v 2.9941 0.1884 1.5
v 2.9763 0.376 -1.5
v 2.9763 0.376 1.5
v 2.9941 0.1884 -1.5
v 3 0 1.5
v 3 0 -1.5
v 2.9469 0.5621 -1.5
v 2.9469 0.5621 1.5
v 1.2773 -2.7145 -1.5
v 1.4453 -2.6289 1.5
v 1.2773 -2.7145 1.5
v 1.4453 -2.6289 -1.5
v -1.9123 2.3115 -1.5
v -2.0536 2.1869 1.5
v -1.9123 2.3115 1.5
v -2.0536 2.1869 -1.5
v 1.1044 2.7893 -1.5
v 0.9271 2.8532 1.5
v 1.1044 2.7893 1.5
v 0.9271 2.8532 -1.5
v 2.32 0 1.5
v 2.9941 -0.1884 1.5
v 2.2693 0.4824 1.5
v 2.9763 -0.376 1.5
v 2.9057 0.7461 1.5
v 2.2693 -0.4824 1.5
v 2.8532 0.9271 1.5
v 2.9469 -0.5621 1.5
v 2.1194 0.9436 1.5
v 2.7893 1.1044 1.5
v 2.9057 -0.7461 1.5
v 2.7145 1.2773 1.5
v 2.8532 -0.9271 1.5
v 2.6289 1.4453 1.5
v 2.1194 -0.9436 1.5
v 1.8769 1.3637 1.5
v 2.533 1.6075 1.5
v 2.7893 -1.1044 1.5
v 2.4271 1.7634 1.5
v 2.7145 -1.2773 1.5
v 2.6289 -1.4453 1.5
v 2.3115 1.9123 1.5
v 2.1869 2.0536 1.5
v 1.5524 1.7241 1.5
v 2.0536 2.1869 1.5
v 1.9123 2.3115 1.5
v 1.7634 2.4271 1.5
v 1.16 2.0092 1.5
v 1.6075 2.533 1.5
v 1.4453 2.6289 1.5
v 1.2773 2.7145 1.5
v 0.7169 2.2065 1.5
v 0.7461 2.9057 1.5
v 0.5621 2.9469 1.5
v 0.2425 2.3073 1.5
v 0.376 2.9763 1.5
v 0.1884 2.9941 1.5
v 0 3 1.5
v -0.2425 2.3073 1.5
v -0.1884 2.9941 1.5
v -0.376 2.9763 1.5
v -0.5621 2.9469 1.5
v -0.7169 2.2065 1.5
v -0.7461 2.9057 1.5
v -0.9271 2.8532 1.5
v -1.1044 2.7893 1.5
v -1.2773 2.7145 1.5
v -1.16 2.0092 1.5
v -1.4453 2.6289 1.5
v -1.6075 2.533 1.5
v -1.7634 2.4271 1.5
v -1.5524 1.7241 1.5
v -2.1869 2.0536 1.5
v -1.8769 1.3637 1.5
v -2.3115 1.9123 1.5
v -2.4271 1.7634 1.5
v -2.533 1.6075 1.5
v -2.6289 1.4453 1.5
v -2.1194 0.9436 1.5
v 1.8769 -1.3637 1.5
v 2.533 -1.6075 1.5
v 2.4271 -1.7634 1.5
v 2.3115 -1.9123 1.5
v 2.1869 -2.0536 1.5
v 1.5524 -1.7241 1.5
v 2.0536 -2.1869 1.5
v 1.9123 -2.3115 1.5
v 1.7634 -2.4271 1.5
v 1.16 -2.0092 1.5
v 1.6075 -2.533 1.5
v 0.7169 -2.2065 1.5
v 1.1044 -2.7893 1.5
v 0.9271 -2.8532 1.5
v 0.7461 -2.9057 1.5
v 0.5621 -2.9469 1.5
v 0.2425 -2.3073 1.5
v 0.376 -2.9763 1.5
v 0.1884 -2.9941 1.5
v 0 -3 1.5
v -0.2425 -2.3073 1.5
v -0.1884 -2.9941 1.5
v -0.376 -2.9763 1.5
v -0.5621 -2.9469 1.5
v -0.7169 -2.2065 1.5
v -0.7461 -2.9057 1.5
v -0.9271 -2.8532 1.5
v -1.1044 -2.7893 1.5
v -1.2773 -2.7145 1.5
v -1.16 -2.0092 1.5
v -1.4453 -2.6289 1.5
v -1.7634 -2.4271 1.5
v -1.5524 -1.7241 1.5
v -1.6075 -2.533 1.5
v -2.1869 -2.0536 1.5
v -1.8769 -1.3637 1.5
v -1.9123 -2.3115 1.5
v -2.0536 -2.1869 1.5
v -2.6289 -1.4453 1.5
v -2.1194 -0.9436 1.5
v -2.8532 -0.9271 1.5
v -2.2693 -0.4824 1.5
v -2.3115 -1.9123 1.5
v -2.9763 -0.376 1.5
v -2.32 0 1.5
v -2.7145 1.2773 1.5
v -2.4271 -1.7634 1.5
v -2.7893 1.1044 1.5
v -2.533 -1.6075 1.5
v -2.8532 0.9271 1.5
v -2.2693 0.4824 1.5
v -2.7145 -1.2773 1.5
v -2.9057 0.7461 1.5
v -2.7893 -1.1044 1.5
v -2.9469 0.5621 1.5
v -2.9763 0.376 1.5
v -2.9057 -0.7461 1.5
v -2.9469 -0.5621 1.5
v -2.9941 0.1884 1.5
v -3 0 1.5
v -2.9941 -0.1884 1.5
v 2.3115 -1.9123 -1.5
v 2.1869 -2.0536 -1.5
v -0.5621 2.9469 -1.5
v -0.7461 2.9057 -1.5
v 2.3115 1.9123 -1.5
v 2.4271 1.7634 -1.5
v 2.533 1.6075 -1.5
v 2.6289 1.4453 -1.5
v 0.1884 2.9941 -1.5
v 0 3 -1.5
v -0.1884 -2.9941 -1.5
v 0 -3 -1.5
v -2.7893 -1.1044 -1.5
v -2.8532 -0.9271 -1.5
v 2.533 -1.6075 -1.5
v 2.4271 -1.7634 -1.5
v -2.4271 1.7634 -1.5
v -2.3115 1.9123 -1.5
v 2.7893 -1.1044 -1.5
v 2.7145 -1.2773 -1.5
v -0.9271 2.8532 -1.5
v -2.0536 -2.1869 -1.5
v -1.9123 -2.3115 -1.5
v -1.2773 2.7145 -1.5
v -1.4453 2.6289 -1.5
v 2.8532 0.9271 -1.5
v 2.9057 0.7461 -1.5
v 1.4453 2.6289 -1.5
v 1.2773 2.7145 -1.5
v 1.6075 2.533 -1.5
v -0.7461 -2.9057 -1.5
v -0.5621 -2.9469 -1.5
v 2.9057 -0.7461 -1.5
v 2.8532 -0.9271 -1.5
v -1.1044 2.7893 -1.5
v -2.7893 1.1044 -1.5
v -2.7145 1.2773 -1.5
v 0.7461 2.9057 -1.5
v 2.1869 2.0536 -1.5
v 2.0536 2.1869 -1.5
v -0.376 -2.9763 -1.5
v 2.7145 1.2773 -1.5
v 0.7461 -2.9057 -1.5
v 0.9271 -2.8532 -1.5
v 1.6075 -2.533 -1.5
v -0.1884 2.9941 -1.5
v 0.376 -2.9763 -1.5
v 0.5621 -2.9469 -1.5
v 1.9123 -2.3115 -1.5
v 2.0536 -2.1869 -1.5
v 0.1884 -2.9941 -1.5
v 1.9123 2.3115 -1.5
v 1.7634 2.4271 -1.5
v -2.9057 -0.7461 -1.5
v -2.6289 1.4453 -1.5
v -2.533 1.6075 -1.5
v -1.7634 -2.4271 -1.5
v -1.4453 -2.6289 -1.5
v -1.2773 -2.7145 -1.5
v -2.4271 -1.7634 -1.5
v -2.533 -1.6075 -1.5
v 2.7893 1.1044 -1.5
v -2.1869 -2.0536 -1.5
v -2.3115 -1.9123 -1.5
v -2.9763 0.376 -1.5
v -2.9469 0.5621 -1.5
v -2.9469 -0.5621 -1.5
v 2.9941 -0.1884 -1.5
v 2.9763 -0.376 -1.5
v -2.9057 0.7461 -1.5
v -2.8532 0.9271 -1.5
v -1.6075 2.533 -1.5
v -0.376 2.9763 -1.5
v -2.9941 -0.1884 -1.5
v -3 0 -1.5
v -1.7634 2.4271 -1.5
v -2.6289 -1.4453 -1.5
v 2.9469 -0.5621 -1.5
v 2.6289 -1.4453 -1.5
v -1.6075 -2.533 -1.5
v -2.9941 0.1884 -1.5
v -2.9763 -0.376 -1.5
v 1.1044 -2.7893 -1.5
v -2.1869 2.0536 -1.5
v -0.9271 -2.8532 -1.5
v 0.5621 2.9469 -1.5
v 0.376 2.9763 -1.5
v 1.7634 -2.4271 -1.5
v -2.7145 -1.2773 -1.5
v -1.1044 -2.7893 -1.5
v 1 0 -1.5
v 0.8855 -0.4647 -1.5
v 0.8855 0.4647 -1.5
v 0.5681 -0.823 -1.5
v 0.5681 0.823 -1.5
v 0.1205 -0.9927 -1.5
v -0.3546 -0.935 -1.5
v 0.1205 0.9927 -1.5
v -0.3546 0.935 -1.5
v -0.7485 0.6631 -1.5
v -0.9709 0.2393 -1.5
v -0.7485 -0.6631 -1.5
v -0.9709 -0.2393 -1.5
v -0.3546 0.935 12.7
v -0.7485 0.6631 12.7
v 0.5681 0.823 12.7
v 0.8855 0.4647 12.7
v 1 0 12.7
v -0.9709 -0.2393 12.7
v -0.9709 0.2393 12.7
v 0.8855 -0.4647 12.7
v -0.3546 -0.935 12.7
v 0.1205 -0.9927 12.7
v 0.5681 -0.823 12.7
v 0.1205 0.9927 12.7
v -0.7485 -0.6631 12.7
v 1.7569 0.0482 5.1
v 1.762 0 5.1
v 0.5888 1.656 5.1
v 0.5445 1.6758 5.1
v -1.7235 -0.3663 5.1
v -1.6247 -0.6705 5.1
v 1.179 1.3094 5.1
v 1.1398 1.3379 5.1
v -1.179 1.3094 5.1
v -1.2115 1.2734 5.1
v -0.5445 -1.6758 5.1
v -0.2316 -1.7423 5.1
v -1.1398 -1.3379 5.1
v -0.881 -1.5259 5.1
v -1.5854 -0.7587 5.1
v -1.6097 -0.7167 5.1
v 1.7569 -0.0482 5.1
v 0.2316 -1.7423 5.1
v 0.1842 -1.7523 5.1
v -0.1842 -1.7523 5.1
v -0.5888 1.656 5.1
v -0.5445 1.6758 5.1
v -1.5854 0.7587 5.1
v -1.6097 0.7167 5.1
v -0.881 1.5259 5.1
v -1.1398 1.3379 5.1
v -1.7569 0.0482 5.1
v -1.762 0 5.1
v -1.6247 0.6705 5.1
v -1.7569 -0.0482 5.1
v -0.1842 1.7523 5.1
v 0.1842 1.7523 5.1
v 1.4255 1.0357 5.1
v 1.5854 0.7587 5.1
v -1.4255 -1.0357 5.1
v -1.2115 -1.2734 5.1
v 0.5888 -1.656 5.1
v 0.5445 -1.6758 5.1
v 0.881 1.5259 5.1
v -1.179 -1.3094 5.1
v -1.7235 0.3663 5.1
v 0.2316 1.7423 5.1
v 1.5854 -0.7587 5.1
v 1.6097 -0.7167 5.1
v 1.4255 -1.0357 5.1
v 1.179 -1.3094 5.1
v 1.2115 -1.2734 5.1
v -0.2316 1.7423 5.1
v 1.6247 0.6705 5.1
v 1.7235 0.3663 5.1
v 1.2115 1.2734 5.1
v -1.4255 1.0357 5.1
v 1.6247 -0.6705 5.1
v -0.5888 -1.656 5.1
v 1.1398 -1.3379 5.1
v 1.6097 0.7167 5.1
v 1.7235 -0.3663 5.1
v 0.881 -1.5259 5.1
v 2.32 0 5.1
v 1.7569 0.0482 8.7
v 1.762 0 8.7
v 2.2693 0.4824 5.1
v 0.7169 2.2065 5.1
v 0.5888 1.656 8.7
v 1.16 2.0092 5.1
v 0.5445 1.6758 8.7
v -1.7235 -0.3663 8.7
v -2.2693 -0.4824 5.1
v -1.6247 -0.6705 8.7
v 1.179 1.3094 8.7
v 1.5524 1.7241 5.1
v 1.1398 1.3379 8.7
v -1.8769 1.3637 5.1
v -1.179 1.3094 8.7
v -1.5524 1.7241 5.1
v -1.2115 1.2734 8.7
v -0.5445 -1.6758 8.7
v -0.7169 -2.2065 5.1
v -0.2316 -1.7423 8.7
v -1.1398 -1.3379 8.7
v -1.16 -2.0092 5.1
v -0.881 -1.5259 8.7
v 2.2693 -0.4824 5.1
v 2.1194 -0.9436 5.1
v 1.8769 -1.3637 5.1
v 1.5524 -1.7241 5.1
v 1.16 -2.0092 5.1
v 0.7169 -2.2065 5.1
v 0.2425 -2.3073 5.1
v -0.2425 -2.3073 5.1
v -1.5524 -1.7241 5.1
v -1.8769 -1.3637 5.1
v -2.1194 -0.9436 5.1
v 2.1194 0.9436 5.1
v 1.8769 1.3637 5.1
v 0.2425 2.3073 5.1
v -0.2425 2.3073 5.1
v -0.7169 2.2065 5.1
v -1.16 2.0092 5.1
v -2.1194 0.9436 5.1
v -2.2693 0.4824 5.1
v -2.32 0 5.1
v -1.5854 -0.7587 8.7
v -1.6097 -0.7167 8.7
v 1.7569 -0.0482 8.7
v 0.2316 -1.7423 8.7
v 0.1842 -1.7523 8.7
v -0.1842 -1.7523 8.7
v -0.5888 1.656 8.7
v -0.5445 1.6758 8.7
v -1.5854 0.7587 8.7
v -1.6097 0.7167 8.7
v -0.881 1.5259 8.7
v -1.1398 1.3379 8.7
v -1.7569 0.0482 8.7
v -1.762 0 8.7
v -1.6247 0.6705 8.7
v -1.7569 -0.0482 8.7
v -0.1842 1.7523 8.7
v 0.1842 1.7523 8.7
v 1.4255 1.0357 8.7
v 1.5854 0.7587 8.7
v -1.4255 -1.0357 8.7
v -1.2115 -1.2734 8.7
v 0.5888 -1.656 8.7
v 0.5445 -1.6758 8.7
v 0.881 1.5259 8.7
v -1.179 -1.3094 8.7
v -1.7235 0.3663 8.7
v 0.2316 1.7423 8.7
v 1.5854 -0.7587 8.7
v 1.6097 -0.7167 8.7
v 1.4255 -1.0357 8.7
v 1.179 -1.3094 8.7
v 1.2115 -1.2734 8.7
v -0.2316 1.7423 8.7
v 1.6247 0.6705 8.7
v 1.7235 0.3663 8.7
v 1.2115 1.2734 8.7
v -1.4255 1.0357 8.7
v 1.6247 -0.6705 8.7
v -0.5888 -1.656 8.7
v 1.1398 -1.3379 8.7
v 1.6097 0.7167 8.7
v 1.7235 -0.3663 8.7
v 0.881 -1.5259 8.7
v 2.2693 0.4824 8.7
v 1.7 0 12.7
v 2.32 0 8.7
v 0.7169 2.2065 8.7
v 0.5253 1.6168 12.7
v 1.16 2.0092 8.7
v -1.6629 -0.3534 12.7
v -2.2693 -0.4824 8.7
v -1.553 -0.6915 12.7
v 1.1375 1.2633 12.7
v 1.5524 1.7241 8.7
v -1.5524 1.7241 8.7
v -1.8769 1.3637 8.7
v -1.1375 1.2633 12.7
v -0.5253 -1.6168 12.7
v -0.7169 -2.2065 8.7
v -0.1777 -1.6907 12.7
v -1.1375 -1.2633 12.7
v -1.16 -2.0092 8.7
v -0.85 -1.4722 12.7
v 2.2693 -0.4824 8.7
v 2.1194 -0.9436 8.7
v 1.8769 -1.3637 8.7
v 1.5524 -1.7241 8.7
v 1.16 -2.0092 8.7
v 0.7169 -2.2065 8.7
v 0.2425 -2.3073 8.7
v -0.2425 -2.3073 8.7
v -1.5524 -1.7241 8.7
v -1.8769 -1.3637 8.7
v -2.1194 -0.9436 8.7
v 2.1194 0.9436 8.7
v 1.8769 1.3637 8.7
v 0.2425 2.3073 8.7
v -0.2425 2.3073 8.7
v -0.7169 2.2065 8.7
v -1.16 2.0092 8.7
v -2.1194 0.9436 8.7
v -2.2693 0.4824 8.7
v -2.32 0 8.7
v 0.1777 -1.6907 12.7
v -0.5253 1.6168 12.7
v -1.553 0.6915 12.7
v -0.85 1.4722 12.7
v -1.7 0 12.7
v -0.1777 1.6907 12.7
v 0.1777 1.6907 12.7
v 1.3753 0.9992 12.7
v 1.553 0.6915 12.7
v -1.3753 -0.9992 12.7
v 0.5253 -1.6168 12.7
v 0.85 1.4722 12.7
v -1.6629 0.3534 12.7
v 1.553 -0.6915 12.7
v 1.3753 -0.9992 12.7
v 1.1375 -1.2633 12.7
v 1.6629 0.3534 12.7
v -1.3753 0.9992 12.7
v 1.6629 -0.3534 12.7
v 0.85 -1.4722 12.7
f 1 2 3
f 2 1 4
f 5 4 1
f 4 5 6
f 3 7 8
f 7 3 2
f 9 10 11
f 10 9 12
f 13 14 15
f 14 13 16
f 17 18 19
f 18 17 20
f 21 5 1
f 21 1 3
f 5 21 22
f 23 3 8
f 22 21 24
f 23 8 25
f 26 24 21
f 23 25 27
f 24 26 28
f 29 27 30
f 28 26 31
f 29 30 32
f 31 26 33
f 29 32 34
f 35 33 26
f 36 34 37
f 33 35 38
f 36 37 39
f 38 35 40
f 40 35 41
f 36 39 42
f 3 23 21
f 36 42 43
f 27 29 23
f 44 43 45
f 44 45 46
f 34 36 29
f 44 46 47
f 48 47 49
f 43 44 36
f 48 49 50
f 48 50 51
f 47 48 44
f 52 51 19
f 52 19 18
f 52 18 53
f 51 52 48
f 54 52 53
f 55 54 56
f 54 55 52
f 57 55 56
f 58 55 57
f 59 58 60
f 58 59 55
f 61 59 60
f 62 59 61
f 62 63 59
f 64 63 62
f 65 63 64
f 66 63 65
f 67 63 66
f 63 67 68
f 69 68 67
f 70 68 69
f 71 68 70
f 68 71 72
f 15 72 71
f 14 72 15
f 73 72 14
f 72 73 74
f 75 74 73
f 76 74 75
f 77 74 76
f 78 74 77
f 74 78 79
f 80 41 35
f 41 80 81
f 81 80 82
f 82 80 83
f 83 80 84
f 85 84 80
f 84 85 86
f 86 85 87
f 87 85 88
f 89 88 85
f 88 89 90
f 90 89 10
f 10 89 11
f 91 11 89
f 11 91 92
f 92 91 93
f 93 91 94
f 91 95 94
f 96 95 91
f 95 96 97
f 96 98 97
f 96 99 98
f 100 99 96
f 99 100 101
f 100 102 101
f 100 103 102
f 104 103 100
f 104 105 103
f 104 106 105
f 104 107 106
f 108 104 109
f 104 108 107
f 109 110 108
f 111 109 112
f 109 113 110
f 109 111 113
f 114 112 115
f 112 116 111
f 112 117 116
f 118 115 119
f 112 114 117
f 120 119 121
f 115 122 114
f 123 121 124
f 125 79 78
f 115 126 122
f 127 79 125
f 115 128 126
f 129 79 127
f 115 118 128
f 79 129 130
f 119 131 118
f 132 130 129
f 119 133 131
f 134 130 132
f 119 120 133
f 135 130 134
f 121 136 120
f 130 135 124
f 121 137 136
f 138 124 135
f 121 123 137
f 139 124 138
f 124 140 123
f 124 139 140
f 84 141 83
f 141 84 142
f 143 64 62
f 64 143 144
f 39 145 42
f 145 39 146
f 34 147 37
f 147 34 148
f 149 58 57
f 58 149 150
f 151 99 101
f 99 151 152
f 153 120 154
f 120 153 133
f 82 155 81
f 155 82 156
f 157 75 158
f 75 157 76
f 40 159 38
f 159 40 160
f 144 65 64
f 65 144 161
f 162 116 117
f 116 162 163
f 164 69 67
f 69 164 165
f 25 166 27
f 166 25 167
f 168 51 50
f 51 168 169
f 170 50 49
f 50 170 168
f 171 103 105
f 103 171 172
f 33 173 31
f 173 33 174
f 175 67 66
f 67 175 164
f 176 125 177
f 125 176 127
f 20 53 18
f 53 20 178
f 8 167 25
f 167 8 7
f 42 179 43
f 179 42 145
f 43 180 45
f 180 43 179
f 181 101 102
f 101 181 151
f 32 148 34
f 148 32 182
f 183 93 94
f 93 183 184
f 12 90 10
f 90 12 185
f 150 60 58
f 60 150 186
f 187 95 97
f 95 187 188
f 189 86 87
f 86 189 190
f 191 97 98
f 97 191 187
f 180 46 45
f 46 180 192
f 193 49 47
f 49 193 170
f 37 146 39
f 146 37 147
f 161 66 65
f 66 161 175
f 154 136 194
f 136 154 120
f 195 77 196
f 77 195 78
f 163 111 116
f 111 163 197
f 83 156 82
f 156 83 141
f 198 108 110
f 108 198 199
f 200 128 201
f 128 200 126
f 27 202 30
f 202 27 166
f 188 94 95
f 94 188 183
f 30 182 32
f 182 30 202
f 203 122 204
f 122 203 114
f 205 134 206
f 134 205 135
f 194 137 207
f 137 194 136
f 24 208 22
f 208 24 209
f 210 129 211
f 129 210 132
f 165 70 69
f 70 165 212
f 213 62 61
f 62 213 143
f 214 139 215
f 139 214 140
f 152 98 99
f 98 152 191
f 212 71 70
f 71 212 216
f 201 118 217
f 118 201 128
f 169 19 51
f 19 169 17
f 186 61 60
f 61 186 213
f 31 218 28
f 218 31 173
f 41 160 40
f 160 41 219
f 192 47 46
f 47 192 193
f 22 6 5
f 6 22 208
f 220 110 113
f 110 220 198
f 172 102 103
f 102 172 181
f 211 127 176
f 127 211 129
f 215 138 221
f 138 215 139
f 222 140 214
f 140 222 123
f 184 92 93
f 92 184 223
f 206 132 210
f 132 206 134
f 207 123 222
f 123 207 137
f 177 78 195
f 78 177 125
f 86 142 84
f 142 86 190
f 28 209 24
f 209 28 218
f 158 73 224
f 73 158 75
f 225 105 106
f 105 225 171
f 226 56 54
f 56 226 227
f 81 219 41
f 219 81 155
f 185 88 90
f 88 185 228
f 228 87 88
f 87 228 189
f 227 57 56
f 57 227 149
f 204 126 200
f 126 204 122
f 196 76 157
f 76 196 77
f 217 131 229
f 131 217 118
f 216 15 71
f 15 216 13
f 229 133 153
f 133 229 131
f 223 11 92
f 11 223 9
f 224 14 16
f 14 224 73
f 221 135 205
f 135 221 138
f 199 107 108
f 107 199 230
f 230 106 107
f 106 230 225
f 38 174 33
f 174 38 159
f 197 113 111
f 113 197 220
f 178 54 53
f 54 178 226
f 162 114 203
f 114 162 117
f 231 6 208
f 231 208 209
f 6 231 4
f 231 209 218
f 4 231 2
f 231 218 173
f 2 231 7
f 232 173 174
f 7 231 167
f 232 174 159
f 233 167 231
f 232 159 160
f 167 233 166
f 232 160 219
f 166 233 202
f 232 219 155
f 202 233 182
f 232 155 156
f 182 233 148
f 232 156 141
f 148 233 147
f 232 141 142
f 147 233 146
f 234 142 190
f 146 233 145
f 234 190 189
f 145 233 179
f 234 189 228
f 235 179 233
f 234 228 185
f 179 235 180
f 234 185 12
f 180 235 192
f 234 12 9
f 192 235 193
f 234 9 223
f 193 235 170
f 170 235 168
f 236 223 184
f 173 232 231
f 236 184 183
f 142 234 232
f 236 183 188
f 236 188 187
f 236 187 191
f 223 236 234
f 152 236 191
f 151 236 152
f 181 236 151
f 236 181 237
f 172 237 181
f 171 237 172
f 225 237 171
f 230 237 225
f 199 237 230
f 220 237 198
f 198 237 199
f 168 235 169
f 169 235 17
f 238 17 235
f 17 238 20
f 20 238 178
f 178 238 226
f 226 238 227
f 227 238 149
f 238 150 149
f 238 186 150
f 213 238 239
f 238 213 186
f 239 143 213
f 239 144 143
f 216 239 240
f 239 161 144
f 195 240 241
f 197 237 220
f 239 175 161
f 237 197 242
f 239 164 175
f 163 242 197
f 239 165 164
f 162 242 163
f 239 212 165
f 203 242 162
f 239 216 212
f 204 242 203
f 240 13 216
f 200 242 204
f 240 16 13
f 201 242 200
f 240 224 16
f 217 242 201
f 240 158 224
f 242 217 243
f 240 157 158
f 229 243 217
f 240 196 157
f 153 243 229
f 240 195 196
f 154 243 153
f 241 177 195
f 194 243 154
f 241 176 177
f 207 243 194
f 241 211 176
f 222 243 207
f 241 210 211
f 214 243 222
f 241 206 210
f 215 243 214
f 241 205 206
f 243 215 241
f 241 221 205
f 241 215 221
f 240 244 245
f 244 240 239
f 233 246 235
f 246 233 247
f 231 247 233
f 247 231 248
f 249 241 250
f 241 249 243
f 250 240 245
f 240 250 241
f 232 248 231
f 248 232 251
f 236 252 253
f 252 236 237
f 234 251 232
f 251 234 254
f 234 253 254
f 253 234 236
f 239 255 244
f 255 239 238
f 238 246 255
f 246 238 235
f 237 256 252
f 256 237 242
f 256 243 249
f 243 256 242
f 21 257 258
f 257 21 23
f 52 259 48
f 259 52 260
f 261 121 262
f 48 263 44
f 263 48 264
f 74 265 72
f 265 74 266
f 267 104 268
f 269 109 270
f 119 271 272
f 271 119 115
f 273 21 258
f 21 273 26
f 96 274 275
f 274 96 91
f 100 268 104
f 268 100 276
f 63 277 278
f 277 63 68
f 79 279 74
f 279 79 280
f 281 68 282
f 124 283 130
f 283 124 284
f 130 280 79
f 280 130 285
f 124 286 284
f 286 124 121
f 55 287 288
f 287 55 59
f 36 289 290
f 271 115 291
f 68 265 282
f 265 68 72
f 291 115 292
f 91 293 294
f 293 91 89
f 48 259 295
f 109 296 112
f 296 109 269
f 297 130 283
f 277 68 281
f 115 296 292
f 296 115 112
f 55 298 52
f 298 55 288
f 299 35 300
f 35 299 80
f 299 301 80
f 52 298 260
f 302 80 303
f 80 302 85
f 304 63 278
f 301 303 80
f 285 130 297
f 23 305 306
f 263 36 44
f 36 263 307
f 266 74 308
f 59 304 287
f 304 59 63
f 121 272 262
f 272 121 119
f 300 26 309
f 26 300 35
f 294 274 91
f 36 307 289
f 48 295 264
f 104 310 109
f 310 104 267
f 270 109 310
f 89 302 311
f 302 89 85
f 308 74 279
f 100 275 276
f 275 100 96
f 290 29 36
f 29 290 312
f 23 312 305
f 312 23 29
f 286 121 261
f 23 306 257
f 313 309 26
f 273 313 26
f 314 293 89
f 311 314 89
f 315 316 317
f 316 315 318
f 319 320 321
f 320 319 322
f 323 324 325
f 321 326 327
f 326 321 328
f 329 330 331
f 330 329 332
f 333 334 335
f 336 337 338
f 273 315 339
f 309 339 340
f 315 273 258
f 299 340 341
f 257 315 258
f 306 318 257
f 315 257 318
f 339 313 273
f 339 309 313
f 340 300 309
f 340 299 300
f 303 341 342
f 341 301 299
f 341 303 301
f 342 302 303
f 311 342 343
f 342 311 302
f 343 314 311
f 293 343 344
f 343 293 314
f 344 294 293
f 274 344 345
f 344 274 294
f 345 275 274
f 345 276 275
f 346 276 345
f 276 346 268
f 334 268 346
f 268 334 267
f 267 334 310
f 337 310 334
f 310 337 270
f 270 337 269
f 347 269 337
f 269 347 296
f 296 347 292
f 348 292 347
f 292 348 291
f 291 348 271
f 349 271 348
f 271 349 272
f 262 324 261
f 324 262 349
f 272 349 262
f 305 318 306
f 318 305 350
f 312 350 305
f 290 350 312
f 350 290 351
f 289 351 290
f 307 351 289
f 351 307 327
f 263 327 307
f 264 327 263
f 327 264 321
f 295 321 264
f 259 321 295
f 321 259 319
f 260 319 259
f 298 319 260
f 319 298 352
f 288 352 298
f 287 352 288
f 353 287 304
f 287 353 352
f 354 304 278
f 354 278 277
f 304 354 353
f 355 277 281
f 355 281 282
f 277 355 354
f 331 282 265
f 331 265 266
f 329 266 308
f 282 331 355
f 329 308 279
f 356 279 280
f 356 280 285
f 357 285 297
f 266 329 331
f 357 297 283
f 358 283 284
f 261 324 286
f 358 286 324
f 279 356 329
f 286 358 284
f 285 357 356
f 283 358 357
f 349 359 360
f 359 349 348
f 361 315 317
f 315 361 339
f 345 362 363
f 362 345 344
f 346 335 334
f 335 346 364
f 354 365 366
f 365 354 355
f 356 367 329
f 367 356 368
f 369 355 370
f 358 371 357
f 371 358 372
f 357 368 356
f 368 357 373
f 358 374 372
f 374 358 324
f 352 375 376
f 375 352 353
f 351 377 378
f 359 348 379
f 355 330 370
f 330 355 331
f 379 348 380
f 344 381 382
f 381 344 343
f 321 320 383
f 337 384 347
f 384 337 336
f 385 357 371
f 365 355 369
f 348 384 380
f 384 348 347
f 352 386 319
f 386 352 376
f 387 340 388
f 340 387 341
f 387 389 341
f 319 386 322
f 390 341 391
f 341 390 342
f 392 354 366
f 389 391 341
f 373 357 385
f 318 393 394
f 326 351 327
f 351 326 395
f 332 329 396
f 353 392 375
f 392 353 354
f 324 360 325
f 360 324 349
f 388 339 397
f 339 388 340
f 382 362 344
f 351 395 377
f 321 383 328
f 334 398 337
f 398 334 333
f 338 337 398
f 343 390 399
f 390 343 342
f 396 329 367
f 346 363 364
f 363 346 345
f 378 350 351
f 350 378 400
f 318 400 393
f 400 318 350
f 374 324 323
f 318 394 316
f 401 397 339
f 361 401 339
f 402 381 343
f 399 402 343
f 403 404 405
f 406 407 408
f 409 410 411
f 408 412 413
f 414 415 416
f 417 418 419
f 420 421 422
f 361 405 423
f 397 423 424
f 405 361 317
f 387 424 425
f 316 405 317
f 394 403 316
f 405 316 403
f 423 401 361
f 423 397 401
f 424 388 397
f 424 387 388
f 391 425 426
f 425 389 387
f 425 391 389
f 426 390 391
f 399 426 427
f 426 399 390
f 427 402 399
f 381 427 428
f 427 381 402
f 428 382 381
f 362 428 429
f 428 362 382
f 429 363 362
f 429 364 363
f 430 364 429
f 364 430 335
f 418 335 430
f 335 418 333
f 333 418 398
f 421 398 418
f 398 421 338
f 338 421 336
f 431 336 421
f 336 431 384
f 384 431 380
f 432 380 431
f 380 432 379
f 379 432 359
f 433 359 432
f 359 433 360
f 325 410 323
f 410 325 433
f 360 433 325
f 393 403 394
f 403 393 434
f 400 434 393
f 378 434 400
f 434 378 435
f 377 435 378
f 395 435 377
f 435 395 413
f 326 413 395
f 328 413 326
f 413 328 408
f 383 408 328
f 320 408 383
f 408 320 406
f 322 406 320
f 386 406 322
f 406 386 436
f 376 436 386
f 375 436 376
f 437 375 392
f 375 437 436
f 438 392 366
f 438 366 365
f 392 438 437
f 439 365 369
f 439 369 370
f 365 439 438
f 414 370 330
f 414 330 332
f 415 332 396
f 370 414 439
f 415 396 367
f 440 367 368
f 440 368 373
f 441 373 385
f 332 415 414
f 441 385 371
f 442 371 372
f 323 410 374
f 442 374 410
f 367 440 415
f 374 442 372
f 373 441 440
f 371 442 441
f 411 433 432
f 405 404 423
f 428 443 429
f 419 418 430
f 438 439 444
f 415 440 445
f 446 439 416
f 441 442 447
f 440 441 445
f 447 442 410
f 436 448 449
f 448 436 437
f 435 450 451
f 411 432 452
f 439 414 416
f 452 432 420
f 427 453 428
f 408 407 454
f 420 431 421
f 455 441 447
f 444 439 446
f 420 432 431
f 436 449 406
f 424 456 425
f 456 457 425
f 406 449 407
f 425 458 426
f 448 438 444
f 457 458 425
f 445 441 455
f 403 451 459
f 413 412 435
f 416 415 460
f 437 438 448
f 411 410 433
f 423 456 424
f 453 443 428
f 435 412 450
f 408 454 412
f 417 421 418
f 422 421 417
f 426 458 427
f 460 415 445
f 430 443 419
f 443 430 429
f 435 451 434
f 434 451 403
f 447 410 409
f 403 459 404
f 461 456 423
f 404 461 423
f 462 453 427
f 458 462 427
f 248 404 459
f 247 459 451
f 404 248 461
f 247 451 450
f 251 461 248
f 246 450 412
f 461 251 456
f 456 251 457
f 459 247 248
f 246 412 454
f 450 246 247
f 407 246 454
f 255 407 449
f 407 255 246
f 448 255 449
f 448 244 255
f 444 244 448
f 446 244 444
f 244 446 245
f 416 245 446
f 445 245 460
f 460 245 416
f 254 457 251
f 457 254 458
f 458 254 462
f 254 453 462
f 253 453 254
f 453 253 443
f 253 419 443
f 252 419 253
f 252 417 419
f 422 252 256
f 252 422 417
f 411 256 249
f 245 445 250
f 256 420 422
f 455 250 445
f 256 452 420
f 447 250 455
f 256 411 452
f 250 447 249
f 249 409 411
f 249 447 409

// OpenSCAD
// file: ../../lib/water/tube_connector.scad
/*
Adapted from: Hose barb adapter and manifold by papergeek  www.thingiverse.com/thing:158717

*/

//tube_connector(4, 1, 3, 1, 4);

module tube_connector_unit(Size=4, Size_barb_count=4, Size_Bore) {
  difference() {
    union() {
      for ( i = [1:Size_barb_count]) {
        translate([0, 0, (i - 1) * Size * 0.9])
          cylinder( h = Size , r2 = Size * 0.85 / 2, r1 = Size * 1.16 / 2, $fa = 0.5, $fs = 0.5 );
      }
    }
    translate([0, 0, -0.1]) cylinder(h = Size * Size_barb_count , d = Size_Bore, $fa = 0.5, $fs = 0.5 );
  }
}


module tube_connector(Size=4, Wall_Thickness=1, Size_barb_count = 4, Shoulder=1, Shoulder_height) {

  Size_Bore = Size - (Wall_Thickness * 2);
  Size_1 = Size + 2*Shoulder; // size of manifols 

  union() {
    difference() {
      cylinder( h = Shoulder_height , d = Size_1, center = true, $fa = 0.5, $fs = 0.5, $fn = 100 )  ;
      cylinder(h = Shoulder_height + 1, d1 = Size_Bore, d2 = Size_Bore, center = true, $fa = 0.5, $fs = 0.5 );
    }
    translate([0, 0, Shoulder_height / 2]) {
      tube_connector_unit(Size, Size_barb_count, Size_Bore);
    }
  }
}
// main file
include <../../lib/water/tube_connector.scad>;

tube_connector(4, 1, 3, 1, 3);
